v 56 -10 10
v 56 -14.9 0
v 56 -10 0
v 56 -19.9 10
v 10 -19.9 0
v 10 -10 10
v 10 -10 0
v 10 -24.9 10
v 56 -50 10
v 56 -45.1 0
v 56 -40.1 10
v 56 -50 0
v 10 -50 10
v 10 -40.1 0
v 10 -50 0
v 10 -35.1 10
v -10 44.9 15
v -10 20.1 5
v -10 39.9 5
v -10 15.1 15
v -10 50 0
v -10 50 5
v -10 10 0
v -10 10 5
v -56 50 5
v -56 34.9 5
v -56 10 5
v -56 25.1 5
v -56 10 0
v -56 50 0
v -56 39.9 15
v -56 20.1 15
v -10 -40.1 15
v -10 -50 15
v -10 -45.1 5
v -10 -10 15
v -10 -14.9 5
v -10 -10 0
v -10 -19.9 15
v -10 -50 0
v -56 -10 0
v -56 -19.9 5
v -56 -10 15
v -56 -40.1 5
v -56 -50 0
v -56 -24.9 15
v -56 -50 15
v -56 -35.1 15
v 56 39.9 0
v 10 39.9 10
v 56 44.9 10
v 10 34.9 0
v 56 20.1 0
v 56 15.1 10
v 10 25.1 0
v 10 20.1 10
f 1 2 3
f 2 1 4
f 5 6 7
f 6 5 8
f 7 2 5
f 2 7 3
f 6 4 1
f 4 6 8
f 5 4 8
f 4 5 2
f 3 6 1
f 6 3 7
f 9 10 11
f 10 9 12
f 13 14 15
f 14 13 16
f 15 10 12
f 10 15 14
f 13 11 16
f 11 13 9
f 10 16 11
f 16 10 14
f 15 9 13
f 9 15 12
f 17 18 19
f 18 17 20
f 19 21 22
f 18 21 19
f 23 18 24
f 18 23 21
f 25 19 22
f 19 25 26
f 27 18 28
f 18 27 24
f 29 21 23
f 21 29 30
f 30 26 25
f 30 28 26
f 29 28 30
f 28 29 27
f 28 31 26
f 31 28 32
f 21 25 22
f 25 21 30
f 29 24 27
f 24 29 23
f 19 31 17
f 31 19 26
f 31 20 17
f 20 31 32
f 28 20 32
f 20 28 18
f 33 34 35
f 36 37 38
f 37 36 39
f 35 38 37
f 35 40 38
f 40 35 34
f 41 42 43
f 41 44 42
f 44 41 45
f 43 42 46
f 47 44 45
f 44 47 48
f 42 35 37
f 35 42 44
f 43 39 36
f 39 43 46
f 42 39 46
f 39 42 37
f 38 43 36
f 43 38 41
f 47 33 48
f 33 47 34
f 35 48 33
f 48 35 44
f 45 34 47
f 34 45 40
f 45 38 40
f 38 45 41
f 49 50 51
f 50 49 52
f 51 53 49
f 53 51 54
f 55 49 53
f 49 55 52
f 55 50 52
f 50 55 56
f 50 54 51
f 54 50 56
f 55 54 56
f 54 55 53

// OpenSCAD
/*
 * Dovetail connectors
 */
Dovetail_Gender   = male();        // Gender of the connector.
Dovetail_Margin   = 0.2;           // Margin that male connector is smaller than female.
Dovetail_Size     = [46, 40, 10];  // Size of the cube the connectors are 'carved' out.
Dovetail_Plate    = 5;             // Size of a plate attached to dovetail.

// convenience functions so above constants can be used when USE-ing this file.
function female()         = true;
function male()           = false;
function yes()            = true;
function no()             = false;
function dovetailGender() = Dovetail_Gender;
function dovetailMargin() = Dovetail_Margin;
function dovetailSize()   = Dovetail_Size;
function dovetailPlate()  = Dovetail_Plate;

module dovetail(gender = dovetailGender(),
                size   = dovetailSize(),
                margin = dovetailMargin(),
                center = no())
{
  H      = (margin < 0) ? 1.999 : 2;
  M      = abs(margin) / 2;
  Xm     = size[0] / -H;
  XM     = size[0] /  H;
  Ym     = size[1] / -H;
  YM     = size[1] /  H;
  Zm     = size[2] / (gender ?  H : -H);
  ZM     = size[2] / (gender ? -H :  H);
  Y1     = (size[1] / 8) + (gender ? -M : M);
  Y2     = (size[1] / 4) + (gender ? -M : M);
  Y3     = ((size[1] * 3) / 8) + (gender ? -M : M);
  points = [[XM, YM - Y1, ZM], [XM, Ym + Y1, ZM], [XM, Ym + Y2, Zm], [XM, YM - Y2, Zm],
            [Xm, YM - Y2, ZM], [Xm, Ym + Y2, ZM], [Xm, Ym + Y3, Zm], [Xm, YM - Y3, Zm],
            [XM, YM,      ZM], [XM, YM,      Zm], [Xm, YM,      ZM], [Xm, YM,      Zm],
            [XM, Ym,      ZM], [XM, Ym,      Zm], [Xm, Ym,      ZM], [Xm, Ym,      Zm]];

  translate(center ? [0, 0, 0] : size / 2)
    if (gender) {
      // female
      polyhedron(points = points, faces  = [[0,  8,  9,  3], [ 4,  7, 11, 10],
                                            [0,  4, 10,  8], [ 3,  9, 11,  7],
                                            [0,  3,  7,  4], [ 8, 10, 11,  9]]);
      polyhedron(points = points, faces  = [[1,  2, 13, 12], [ 5, 14, 15,  6],
                                            [1, 12, 14,  5], [ 2,  6, 15, 13],
                                            [1,  5,  6,  2], [12, 13, 15, 14]]);
    } else {
      // male
      polyhedron(points = points, faces  = [[0,  3,  2,  1], [ 4,  5,  6,  7],
                                            [0,  1,  5,  4], [ 2,  3,  7,  6],
                                            [0,  4,  7,  3], [ 1,  2,  6,  5]]);
    }
}
translate([10,  10, 0])
  dovetail(male());
translate([10, -50, 0])
  dovetail(female());

module dovetailPlate(gender = dovetailGender(),
                     size   = dovetailSize(),
                     margin = dovetailMargin(),
                     plate  = dovetailPlate(),
                     center = no())
{
  if (len(plate) == undef) {
    translate(center ? [0, 0, 0] : [size[0] / 2,
                                    size[1] / 2,
                                   (size[2] + plate) / 2])
    {
      translate([0, 0, size[2] / -2])
        cube([size[0], size[1], plate], yes());
      translate([0, 0, plate / 2])
        dovetail(gender, size, margin, yes(), no());
    }
  } else {
    translate(center ? [0, 0, 0] : [max(size[0], plate[0]) / 2,
                                    max(size[1], plate[1]) / 2,
                                    (size[2] + plate[2]) / 2])
    {
      translate([0, 0, size[2] / -2])
        cube(plate, true);
      translate([0, 0, plate[2] / 2])
        dovetail(gender, size, margin, yes(), no());
    }
  }
}
translate([-56,  10, 0])
  dovetailPlate(male());
translate([-56, -50, 0])
  dovetailPlate(female());
